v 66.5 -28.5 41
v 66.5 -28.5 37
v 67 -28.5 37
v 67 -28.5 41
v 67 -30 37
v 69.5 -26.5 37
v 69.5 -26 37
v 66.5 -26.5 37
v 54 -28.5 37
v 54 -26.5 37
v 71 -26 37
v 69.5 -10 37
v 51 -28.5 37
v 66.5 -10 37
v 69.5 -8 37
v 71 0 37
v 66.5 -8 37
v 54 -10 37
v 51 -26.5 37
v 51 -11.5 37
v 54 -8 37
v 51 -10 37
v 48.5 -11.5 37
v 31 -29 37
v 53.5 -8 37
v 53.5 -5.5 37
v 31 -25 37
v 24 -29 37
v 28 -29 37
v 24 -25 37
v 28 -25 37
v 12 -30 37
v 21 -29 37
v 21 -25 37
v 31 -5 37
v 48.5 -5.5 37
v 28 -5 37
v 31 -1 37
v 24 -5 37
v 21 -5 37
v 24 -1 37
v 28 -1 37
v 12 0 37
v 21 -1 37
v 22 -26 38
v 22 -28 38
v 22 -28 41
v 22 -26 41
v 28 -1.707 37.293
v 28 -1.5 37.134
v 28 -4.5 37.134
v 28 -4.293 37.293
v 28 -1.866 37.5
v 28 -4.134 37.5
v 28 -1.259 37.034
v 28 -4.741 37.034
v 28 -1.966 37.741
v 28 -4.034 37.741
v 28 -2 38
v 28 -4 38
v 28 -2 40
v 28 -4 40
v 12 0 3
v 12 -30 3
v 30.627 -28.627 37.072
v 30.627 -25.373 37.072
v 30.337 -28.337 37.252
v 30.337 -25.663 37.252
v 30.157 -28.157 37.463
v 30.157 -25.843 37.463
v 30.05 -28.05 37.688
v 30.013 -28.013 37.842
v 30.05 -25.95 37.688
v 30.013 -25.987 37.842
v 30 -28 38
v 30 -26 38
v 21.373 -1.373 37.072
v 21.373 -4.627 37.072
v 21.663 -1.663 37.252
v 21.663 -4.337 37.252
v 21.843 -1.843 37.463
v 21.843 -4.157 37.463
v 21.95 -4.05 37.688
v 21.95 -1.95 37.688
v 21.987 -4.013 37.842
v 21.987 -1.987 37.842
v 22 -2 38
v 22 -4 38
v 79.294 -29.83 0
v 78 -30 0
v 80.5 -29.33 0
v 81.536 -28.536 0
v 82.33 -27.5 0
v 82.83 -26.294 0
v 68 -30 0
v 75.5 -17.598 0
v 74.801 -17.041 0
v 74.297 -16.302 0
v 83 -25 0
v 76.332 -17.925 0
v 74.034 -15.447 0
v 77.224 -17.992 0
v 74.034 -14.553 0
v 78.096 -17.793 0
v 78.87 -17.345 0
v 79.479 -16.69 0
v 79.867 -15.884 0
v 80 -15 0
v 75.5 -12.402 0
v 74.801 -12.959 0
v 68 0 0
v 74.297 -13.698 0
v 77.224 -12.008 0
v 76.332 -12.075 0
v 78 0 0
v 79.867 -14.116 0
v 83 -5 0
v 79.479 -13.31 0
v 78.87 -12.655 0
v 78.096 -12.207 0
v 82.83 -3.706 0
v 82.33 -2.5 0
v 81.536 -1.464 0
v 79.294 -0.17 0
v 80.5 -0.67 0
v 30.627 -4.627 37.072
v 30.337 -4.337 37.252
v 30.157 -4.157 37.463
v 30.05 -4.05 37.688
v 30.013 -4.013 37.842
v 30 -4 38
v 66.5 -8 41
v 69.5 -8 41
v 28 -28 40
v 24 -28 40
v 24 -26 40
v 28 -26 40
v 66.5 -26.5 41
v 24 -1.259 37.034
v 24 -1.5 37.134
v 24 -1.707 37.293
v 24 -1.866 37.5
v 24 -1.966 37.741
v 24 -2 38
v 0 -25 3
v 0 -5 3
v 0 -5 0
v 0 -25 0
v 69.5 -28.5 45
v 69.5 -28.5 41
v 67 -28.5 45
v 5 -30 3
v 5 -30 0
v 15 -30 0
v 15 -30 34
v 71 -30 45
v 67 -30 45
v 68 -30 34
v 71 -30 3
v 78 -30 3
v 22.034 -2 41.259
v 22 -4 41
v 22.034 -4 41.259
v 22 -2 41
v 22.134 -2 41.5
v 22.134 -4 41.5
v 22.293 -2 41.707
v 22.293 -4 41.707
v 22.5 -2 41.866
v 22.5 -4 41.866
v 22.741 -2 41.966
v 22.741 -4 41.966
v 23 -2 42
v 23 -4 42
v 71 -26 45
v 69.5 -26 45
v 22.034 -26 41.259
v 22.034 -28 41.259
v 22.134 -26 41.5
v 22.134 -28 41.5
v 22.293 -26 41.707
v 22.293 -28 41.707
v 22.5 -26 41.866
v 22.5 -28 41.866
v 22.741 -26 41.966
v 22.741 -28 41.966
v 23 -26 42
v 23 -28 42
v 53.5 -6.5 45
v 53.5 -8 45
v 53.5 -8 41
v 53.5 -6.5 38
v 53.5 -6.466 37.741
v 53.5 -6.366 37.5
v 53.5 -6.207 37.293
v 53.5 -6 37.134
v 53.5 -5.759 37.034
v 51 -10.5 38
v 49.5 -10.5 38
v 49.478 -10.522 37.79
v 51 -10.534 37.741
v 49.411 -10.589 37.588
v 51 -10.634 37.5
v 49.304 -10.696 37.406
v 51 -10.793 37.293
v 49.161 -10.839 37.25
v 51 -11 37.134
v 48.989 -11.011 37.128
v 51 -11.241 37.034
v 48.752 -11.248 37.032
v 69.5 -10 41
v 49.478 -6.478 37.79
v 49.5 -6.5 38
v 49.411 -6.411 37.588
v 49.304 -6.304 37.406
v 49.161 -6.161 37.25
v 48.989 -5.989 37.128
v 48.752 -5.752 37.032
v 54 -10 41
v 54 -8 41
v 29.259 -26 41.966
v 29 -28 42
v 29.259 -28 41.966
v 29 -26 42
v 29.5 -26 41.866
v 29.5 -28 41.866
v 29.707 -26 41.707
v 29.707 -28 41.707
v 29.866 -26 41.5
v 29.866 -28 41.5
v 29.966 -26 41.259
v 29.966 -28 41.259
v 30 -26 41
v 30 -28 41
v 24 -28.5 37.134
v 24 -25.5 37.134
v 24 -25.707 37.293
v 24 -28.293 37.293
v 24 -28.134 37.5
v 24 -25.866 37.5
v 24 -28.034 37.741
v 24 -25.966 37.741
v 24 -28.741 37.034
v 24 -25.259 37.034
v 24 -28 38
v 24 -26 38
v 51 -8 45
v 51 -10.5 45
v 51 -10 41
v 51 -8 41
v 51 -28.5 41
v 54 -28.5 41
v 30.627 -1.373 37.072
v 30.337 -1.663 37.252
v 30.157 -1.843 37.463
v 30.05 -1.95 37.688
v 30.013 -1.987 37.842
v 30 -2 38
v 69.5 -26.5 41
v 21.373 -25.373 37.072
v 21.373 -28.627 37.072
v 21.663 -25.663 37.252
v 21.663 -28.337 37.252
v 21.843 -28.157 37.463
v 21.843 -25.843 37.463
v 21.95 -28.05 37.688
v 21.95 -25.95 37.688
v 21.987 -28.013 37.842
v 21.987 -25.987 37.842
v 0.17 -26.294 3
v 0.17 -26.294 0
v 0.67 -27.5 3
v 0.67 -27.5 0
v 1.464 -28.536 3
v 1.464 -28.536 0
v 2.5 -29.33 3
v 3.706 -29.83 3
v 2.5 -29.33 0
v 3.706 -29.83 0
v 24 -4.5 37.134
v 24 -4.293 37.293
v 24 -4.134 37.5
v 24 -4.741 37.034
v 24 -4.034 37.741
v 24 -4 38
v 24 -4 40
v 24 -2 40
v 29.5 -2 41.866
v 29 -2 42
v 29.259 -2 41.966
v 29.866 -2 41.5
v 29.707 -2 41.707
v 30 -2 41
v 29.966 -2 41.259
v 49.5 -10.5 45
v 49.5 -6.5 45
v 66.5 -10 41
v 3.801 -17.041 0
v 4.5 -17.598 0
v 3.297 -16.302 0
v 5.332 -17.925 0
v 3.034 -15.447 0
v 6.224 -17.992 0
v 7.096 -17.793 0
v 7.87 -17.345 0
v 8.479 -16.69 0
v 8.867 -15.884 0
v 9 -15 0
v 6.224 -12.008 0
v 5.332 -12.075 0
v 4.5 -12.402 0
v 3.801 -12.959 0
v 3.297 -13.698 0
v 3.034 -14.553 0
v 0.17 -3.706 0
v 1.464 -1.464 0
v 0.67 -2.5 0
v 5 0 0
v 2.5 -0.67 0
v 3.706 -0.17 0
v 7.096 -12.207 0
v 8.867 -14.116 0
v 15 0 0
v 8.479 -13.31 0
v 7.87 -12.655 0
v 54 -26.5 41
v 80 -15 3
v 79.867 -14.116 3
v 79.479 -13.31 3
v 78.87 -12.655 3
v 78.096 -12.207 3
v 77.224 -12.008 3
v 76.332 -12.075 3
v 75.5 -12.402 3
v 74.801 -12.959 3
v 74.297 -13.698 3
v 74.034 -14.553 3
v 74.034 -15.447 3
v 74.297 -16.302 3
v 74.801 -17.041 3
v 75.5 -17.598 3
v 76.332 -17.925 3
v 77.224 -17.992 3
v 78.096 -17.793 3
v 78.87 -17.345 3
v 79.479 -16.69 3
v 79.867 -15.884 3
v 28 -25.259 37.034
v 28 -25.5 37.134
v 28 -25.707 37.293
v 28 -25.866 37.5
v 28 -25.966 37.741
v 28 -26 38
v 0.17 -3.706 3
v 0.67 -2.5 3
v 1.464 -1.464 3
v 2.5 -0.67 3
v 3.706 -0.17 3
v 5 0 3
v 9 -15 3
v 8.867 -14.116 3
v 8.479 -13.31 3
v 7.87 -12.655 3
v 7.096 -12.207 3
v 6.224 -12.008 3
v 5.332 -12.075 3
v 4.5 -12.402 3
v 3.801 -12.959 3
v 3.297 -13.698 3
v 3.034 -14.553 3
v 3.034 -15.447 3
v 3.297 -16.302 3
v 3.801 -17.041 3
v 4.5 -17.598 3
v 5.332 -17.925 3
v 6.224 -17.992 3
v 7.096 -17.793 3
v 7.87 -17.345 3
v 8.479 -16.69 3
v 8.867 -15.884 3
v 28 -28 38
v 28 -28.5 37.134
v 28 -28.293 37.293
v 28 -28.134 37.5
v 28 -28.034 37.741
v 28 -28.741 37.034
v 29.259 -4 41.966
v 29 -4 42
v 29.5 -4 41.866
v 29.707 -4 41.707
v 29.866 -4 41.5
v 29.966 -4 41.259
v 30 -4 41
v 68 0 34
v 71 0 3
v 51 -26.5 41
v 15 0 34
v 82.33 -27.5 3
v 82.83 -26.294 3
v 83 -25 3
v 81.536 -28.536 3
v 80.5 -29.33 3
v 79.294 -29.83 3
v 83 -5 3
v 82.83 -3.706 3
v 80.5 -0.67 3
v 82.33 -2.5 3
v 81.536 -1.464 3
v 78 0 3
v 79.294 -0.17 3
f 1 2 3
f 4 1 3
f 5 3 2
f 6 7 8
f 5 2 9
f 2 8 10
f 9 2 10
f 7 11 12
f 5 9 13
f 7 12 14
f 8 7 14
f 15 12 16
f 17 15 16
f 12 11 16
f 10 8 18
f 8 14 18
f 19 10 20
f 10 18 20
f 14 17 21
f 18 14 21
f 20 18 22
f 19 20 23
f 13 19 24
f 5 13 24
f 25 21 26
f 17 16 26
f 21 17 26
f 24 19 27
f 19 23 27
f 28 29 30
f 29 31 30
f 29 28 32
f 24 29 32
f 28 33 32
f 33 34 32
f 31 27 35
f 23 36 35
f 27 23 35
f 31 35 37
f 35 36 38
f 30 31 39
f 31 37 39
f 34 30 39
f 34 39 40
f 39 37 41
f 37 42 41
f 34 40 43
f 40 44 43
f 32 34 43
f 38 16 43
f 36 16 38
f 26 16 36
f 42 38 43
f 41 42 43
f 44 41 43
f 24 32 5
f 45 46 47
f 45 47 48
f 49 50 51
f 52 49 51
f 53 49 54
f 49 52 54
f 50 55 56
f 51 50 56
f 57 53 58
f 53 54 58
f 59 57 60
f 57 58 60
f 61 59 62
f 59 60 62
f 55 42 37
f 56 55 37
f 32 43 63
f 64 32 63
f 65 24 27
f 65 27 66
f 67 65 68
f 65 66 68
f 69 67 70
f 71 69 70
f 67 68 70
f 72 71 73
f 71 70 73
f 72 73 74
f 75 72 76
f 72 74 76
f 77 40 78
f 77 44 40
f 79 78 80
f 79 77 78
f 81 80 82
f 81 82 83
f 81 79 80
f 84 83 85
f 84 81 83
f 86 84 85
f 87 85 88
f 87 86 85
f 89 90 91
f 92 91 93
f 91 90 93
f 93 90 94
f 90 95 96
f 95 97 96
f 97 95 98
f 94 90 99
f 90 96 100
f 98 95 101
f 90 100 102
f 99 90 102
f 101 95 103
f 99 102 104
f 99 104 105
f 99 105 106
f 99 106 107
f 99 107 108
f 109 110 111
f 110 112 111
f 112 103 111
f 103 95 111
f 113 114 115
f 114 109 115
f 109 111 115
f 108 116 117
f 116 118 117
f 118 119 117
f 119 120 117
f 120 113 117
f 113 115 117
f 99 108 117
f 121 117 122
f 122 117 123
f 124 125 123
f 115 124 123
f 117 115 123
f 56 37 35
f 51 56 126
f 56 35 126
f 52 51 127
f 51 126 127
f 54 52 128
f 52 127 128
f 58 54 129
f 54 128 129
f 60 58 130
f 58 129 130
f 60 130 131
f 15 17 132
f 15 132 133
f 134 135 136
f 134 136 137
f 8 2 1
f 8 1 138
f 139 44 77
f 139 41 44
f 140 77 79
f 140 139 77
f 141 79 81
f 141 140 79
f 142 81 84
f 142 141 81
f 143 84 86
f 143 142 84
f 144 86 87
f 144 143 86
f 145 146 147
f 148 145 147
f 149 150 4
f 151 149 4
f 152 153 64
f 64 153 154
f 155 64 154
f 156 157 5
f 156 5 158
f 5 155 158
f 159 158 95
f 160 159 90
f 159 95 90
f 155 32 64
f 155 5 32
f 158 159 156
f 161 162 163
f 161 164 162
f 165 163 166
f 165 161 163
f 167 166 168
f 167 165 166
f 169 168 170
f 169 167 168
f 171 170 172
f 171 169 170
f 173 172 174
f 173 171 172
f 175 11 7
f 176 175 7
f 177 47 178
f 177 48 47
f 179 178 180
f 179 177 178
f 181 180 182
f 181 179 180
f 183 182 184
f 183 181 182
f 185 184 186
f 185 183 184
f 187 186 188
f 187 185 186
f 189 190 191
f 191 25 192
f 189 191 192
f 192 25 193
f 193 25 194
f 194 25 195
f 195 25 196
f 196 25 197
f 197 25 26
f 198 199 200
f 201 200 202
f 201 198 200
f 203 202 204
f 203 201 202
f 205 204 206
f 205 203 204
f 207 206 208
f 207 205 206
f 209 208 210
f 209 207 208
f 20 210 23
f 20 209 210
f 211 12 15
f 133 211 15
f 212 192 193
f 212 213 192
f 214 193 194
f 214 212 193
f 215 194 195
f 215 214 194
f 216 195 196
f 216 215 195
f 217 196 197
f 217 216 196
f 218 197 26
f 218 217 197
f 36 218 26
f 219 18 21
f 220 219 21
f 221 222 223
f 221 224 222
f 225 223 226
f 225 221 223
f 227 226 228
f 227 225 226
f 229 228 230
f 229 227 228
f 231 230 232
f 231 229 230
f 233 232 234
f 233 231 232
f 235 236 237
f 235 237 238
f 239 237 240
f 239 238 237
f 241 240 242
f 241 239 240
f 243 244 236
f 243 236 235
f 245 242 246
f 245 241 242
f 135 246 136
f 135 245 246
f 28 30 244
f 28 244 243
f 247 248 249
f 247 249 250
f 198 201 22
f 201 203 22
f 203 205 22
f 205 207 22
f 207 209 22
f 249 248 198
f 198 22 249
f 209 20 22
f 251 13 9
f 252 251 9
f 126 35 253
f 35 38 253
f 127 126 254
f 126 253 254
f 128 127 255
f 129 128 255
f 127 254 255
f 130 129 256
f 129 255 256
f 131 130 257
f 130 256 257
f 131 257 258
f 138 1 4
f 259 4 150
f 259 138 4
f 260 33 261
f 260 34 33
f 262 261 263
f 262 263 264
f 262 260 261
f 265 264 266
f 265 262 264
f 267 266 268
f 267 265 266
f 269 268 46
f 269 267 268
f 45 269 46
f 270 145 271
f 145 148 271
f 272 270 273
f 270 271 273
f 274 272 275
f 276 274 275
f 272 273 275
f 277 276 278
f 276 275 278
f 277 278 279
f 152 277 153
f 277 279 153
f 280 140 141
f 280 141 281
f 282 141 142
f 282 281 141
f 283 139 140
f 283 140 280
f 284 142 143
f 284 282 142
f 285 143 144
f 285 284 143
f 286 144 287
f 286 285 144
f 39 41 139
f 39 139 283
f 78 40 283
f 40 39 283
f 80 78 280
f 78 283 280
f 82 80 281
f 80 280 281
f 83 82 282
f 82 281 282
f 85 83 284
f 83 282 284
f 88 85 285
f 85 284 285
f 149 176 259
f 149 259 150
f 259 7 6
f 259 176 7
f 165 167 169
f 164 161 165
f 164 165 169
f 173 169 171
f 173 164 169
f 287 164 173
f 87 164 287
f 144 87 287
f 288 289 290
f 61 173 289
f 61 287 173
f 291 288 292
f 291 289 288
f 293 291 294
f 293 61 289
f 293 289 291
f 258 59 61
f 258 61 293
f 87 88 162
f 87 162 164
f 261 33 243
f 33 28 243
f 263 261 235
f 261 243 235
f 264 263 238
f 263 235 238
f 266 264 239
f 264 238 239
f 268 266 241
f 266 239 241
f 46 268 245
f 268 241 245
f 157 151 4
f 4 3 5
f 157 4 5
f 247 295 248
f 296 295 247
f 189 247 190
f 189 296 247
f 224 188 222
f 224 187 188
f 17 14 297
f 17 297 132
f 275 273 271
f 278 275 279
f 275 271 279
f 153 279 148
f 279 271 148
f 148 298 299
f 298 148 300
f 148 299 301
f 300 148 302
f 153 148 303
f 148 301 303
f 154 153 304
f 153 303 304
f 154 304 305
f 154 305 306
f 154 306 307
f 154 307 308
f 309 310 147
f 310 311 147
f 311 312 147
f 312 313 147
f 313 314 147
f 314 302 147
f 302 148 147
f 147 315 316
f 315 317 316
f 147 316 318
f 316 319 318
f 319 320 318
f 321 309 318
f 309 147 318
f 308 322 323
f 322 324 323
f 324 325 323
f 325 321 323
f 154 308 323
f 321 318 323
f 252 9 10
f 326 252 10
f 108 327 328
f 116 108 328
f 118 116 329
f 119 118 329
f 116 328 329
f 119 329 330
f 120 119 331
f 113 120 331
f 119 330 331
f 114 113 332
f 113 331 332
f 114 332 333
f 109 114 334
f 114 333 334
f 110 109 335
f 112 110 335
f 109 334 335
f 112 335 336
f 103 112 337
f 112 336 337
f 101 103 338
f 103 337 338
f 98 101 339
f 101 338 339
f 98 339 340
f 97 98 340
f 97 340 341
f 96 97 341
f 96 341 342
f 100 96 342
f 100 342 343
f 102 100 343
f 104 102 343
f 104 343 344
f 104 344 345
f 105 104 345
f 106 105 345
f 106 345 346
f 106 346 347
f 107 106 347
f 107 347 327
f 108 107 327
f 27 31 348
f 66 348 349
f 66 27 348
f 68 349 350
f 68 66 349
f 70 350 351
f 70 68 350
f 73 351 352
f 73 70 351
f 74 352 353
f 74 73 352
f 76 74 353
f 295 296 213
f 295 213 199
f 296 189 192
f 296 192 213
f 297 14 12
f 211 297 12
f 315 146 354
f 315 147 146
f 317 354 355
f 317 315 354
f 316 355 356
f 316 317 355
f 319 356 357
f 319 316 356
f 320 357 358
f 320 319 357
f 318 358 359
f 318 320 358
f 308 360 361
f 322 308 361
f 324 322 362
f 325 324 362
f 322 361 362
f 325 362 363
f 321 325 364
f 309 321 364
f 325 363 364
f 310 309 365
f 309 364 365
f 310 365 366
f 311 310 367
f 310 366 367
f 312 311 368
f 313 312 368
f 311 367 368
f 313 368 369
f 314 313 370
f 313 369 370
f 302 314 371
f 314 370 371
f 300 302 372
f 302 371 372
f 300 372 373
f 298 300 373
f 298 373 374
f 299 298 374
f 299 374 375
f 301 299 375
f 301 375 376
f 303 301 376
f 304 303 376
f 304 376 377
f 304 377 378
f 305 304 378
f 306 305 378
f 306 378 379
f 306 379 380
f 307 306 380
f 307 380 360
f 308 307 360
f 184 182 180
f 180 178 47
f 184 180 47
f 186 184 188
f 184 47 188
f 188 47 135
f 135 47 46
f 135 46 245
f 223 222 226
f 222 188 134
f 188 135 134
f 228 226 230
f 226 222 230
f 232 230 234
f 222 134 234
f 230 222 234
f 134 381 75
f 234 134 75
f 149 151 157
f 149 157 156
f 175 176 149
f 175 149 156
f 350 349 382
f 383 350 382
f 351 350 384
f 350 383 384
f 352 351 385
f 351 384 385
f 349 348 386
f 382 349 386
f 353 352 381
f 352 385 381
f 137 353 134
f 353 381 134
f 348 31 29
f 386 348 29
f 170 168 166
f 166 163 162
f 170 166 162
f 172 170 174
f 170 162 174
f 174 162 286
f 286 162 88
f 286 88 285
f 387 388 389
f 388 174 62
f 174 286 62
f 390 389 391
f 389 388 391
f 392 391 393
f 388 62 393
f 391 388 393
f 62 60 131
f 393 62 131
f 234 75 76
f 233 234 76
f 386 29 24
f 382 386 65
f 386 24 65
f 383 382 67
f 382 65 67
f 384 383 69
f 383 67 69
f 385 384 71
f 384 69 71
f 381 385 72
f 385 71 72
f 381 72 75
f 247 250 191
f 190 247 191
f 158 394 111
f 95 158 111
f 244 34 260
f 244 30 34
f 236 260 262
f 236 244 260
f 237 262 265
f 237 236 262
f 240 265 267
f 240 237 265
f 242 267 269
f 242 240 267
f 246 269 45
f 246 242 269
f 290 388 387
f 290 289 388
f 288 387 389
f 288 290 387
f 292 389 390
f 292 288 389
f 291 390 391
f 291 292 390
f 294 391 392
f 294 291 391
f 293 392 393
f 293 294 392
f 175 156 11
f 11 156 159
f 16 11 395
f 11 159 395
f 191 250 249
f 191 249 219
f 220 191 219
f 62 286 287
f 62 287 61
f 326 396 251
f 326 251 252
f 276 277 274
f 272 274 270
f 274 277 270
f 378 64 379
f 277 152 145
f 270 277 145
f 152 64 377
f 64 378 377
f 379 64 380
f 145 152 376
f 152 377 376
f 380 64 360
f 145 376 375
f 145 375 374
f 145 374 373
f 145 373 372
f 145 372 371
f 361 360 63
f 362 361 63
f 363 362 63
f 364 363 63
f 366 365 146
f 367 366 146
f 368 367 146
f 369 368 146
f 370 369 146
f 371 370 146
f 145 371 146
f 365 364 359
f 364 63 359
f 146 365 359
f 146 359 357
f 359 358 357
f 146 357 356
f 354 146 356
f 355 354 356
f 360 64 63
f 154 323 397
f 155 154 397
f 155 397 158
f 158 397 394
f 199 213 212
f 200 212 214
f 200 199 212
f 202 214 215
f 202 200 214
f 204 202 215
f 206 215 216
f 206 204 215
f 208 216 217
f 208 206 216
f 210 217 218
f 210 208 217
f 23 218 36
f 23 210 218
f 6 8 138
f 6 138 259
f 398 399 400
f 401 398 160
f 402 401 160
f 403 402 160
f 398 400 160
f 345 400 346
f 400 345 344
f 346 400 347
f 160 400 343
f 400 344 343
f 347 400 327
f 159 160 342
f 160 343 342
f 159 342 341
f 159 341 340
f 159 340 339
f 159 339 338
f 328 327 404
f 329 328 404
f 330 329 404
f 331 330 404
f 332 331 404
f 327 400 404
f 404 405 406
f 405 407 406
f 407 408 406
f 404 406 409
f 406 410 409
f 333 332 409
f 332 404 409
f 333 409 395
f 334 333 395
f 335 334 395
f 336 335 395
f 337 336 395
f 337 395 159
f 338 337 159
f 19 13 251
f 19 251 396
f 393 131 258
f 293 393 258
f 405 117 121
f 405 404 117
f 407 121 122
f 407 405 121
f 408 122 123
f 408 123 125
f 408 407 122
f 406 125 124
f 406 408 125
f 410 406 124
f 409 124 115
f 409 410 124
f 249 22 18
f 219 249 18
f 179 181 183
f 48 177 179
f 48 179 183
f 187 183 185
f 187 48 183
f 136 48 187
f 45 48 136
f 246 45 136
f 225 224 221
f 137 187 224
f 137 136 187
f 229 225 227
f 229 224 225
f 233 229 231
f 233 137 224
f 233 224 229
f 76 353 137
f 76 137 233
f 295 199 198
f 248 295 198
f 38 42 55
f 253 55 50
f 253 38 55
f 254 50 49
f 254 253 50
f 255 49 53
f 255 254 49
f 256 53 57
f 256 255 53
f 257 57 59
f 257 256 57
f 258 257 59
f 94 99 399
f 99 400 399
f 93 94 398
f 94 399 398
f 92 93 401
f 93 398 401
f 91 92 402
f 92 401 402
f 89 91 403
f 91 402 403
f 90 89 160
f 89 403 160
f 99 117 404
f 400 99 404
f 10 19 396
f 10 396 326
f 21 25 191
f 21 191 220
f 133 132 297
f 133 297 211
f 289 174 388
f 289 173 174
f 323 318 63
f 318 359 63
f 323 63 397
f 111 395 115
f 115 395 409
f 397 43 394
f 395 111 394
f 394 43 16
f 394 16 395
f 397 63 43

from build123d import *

# Parameters (mm, degrees)
F1_DEPTH  = 30
F2_R      = 3
F3_DEPTH  = 3.001
F5_DEPTH  = 8
F6_W      = 8
F6_H      = 2
F7_DEPTH  = 5
F8_W      = 3
F8_H      = 2
F9_DEPTH  = 4
F10_W     = 4
F10_H     = 3
F11_DEPTH = 28.001
F12_R     = 1
F13_R     = 5


with BuildPart() as f1:
    # F0 (on Front) → F1 (new body)
    with BuildSketch(Plane.XZ):
        Polygon((0, 3), (0, 0), (15, 0), (15, 34), (68, 34), (68, 0), (83, 0), (83, 3), (71, 3), (71, 37), (12, 37), (12, 3), align=None)
    extrude(amount=F1_DEPTH)

    # F2 (on face) → F3 (cut, through all)
    with BuildSketch(Plane.XY.offset(3)):
        with Locations((6, -15)):
            Circle(F2_R)
        with Locations((77, -15)):
            Circle(F2_R)
    extrude(amount=-F3_DEPTH, mode=Mode.SUBTRACT)

    # F4 (on face) → F5 (join)
    with BuildSketch(Plane.XY.offset(37)):
        Polygon((71, -30), (71, -26), (69.5, -26), (69.5, -28.5), (67, -28.5), (67, -30), align=None)
        Polygon((53.5, -6.5), (49.5, -6.5), (49.5, -10.5), (51, -10.5), (51, -8), (53.5, -8), align=None)
    extrude(amount=F5_DEPTH)

    # F6 (on face) → F7 (join)
    with BuildSketch(Plane.XY.offset(37)):
        with Locations((26, -3)):
            Rectangle(F6_W, F6_H)
        with Locations((26, -27)):
            Rectangle(F6_W, F6_H)
    extrude(amount=F7_DEPTH)

    # F8 (on face) → F9 (join)
    with BuildSketch(Plane.XY.offset(37)):
        with Locations((52.5, -9)):
            Rectangle(F8_W, F8_H)
        with Locations((68, -27.5)):
            Rectangle(F8_W, F8_H)
        with Locations((68, -9)):
            Rectangle(F8_W, F8_H)
        with Locations((52.5, -27.5)):
            Rectangle(F8_W, F8_H)
    extrude(amount=F9_DEPTH)

    # F10 (on face) → F11 (cut, through all)
    with BuildSketch(Plane.XZ.offset(28)):
        with Locations((26, 38.5)):
            Rectangle(F10_W, F10_H)
    extrude(amount=-F11_DEPTH, mode=Mode.SUBTRACT)

    # F12
    f12_edges = [f1.edges().sort_by_distance(p)[0] for p in [
        (30, -27, 42),
        (30, -3, 42),
        (22, -3, 42),
        (22, -27, 42),
        (22, -27, 37),
        (22, -3, 37),
        (29, -4, 37),
        (23, -4, 37),
        (30, -3, 37),
        (29, -28, 37),
        (23, -28, 37),
        (30, -27, 37),
        (29, -26, 37),
        (23, -26, 37),
        (29, -2, 37),
        (23, -2, 37),
        (51.5, -6.5, 37),
        (49.5, -8.5, 37),
        (50.25, -10.5, 37),
    ]]
    fillet(f12_edges, radius=F12_R)

    # F13
    f13_edges = [f1.edges().sort_by_distance(p)[0] for p in [
        (83, -30, 1.5),
        (83, 0, 1.5),
        (0, 0, 1.5),
        (0, -30, 1.5),
    ]]
    fillet(f13_edges, radius=F13_R)


solid = f1.part
